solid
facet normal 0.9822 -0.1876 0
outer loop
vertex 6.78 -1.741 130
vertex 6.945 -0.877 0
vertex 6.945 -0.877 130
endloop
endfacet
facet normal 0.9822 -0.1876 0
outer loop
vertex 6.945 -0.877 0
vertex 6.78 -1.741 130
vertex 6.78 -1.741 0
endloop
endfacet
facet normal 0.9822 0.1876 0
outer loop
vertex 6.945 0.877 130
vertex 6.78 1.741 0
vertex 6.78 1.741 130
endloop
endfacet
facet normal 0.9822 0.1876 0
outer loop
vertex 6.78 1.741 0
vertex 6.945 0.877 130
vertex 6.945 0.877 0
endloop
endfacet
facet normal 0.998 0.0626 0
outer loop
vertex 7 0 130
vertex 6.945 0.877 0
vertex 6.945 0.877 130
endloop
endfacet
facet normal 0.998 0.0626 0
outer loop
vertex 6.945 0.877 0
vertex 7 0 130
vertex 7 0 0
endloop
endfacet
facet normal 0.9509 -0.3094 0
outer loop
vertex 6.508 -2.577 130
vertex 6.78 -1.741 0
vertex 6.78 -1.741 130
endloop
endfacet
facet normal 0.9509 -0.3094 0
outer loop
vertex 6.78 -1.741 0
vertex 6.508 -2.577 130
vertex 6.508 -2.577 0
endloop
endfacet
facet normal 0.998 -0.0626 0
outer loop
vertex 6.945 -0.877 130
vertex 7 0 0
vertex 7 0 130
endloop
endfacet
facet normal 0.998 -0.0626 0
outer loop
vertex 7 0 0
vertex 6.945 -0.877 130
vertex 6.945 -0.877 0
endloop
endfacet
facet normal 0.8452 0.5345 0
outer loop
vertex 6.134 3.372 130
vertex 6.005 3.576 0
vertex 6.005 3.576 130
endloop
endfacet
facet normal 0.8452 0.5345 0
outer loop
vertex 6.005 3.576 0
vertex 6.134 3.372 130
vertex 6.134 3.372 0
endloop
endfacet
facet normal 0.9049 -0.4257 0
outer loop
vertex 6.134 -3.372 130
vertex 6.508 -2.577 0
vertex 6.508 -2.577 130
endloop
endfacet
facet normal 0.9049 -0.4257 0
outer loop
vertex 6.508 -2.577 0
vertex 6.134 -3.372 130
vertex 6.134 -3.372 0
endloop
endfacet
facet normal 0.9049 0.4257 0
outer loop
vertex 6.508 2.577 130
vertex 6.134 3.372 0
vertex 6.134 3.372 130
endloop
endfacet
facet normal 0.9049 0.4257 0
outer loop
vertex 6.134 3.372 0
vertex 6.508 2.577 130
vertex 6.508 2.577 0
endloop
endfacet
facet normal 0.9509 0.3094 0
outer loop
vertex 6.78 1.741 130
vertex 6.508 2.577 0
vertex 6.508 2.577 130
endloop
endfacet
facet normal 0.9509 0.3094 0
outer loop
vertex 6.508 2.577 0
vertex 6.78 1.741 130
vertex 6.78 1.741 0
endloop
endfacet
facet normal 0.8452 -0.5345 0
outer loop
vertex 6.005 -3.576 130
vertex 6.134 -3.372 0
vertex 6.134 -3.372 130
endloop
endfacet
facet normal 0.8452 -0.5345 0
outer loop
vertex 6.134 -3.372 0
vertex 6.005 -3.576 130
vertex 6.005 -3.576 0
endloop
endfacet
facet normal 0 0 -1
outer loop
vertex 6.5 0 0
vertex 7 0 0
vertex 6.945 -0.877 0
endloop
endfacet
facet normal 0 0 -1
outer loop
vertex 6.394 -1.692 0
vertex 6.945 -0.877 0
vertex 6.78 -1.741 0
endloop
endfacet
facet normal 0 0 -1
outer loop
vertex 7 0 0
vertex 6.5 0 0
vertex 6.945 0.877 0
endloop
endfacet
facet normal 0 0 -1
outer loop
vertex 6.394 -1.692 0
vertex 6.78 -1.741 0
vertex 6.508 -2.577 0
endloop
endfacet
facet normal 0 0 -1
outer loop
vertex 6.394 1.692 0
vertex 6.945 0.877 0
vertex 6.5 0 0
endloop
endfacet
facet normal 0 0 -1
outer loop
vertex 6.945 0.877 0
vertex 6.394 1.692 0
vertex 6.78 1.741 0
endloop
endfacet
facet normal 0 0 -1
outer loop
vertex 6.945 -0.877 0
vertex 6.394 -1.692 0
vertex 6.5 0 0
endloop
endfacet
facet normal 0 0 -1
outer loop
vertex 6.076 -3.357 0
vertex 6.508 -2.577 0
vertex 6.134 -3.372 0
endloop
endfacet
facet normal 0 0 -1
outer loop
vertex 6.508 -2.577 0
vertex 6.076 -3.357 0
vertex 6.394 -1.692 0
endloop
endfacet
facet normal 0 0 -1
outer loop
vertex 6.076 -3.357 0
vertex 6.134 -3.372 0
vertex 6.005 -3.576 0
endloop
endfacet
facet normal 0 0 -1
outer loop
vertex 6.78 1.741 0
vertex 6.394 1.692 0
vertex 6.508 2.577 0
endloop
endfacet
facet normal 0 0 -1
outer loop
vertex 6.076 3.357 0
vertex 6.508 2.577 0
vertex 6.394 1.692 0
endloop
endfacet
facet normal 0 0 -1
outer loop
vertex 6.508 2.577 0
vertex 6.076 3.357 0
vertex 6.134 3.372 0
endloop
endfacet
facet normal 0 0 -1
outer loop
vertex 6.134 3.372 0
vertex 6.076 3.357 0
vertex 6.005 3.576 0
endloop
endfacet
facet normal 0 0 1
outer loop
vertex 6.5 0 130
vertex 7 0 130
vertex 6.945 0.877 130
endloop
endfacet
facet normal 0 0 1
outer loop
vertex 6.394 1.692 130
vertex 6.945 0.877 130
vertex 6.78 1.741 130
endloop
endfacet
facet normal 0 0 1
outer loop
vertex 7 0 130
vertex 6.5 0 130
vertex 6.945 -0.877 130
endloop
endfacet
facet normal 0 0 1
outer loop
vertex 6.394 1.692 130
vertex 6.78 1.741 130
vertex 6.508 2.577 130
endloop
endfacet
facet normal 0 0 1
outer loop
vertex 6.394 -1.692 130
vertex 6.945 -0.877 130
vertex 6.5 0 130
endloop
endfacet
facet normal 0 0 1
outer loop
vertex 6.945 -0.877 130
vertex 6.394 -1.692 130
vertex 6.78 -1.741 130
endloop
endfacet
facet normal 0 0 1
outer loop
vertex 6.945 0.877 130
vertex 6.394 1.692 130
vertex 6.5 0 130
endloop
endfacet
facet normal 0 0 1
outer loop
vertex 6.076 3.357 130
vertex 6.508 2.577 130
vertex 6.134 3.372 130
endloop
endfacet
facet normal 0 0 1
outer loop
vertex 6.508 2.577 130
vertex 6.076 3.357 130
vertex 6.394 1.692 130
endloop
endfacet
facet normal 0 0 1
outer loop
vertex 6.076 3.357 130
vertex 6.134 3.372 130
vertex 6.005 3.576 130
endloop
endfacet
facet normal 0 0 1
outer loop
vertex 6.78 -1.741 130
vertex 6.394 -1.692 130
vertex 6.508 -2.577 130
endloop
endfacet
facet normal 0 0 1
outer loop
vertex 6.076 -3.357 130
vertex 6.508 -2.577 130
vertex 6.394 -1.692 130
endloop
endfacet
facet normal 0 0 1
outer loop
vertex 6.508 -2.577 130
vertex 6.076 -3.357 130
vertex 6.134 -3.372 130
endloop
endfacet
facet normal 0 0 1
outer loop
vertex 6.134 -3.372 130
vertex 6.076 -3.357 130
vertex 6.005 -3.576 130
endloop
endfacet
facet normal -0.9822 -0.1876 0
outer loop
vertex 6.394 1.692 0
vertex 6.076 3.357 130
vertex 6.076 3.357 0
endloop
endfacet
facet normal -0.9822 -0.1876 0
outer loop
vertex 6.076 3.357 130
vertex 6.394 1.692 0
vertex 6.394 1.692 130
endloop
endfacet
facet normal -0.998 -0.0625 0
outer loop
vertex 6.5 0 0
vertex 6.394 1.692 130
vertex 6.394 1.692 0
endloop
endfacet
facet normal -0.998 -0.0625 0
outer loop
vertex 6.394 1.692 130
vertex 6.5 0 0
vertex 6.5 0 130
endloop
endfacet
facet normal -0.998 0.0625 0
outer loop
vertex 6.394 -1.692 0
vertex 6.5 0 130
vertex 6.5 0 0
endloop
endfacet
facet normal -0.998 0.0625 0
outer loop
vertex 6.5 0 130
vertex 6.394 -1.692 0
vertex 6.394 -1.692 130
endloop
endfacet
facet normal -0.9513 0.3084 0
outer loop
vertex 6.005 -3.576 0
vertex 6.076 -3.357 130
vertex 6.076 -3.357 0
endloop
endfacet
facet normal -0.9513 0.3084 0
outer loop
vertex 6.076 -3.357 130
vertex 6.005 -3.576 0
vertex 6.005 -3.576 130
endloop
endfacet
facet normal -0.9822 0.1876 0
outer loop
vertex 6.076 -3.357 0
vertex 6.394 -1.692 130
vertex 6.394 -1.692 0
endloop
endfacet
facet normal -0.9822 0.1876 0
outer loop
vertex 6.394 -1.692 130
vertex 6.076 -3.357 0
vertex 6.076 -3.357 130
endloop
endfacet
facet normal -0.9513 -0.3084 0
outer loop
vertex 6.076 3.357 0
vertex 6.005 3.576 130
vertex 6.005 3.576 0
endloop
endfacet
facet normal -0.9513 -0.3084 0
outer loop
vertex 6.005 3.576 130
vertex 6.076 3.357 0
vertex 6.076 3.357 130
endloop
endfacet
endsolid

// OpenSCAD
$fn = 50;


difference() {
	union() {
		cylinder(h = 130, r = 7.0000000000);
		translate(v = [-10.0000000000, 0, 0]) {
			cylinder(h = 130, r = 7.0000000000);
		}
	}
	union() {
		cylinder(h = 130, r = 3.2500000000);
		cylinder(h = 130, r = 1.8000000000);
		cylinder(h = 130, r = 1.8000000000);
		cylinder(h = 130, r = 1.8000000000);
		translate(v = [-14.5000000000, 0, 0]) {
			hull() {
				translate(v = [-3.7500000000, 0.0000000000, 0]) {
					cylinder(h = 130, r = 10.5000000000);
				}
				translate(v = [3.7500000000, 0.0000000000, 0]) {
					cylinder(h = 130, r = 10.5000000000);
				}
				translate(v = [-3.7500000000, -0.0000000000, 0]) {
					cylinder(h = 130, r = 10.5000000000);
				}
				translate(v = [3.7500000000, -0.0000000000, 0]) {
					cylinder(h = 130, r = 10.5000000000);
				}
			}
		}
		translate(v = [-7.0000000000, 0, 0.0000000000]) {
			cylinder(h = 130, r = 13.5000000000);
		}
	}
}
